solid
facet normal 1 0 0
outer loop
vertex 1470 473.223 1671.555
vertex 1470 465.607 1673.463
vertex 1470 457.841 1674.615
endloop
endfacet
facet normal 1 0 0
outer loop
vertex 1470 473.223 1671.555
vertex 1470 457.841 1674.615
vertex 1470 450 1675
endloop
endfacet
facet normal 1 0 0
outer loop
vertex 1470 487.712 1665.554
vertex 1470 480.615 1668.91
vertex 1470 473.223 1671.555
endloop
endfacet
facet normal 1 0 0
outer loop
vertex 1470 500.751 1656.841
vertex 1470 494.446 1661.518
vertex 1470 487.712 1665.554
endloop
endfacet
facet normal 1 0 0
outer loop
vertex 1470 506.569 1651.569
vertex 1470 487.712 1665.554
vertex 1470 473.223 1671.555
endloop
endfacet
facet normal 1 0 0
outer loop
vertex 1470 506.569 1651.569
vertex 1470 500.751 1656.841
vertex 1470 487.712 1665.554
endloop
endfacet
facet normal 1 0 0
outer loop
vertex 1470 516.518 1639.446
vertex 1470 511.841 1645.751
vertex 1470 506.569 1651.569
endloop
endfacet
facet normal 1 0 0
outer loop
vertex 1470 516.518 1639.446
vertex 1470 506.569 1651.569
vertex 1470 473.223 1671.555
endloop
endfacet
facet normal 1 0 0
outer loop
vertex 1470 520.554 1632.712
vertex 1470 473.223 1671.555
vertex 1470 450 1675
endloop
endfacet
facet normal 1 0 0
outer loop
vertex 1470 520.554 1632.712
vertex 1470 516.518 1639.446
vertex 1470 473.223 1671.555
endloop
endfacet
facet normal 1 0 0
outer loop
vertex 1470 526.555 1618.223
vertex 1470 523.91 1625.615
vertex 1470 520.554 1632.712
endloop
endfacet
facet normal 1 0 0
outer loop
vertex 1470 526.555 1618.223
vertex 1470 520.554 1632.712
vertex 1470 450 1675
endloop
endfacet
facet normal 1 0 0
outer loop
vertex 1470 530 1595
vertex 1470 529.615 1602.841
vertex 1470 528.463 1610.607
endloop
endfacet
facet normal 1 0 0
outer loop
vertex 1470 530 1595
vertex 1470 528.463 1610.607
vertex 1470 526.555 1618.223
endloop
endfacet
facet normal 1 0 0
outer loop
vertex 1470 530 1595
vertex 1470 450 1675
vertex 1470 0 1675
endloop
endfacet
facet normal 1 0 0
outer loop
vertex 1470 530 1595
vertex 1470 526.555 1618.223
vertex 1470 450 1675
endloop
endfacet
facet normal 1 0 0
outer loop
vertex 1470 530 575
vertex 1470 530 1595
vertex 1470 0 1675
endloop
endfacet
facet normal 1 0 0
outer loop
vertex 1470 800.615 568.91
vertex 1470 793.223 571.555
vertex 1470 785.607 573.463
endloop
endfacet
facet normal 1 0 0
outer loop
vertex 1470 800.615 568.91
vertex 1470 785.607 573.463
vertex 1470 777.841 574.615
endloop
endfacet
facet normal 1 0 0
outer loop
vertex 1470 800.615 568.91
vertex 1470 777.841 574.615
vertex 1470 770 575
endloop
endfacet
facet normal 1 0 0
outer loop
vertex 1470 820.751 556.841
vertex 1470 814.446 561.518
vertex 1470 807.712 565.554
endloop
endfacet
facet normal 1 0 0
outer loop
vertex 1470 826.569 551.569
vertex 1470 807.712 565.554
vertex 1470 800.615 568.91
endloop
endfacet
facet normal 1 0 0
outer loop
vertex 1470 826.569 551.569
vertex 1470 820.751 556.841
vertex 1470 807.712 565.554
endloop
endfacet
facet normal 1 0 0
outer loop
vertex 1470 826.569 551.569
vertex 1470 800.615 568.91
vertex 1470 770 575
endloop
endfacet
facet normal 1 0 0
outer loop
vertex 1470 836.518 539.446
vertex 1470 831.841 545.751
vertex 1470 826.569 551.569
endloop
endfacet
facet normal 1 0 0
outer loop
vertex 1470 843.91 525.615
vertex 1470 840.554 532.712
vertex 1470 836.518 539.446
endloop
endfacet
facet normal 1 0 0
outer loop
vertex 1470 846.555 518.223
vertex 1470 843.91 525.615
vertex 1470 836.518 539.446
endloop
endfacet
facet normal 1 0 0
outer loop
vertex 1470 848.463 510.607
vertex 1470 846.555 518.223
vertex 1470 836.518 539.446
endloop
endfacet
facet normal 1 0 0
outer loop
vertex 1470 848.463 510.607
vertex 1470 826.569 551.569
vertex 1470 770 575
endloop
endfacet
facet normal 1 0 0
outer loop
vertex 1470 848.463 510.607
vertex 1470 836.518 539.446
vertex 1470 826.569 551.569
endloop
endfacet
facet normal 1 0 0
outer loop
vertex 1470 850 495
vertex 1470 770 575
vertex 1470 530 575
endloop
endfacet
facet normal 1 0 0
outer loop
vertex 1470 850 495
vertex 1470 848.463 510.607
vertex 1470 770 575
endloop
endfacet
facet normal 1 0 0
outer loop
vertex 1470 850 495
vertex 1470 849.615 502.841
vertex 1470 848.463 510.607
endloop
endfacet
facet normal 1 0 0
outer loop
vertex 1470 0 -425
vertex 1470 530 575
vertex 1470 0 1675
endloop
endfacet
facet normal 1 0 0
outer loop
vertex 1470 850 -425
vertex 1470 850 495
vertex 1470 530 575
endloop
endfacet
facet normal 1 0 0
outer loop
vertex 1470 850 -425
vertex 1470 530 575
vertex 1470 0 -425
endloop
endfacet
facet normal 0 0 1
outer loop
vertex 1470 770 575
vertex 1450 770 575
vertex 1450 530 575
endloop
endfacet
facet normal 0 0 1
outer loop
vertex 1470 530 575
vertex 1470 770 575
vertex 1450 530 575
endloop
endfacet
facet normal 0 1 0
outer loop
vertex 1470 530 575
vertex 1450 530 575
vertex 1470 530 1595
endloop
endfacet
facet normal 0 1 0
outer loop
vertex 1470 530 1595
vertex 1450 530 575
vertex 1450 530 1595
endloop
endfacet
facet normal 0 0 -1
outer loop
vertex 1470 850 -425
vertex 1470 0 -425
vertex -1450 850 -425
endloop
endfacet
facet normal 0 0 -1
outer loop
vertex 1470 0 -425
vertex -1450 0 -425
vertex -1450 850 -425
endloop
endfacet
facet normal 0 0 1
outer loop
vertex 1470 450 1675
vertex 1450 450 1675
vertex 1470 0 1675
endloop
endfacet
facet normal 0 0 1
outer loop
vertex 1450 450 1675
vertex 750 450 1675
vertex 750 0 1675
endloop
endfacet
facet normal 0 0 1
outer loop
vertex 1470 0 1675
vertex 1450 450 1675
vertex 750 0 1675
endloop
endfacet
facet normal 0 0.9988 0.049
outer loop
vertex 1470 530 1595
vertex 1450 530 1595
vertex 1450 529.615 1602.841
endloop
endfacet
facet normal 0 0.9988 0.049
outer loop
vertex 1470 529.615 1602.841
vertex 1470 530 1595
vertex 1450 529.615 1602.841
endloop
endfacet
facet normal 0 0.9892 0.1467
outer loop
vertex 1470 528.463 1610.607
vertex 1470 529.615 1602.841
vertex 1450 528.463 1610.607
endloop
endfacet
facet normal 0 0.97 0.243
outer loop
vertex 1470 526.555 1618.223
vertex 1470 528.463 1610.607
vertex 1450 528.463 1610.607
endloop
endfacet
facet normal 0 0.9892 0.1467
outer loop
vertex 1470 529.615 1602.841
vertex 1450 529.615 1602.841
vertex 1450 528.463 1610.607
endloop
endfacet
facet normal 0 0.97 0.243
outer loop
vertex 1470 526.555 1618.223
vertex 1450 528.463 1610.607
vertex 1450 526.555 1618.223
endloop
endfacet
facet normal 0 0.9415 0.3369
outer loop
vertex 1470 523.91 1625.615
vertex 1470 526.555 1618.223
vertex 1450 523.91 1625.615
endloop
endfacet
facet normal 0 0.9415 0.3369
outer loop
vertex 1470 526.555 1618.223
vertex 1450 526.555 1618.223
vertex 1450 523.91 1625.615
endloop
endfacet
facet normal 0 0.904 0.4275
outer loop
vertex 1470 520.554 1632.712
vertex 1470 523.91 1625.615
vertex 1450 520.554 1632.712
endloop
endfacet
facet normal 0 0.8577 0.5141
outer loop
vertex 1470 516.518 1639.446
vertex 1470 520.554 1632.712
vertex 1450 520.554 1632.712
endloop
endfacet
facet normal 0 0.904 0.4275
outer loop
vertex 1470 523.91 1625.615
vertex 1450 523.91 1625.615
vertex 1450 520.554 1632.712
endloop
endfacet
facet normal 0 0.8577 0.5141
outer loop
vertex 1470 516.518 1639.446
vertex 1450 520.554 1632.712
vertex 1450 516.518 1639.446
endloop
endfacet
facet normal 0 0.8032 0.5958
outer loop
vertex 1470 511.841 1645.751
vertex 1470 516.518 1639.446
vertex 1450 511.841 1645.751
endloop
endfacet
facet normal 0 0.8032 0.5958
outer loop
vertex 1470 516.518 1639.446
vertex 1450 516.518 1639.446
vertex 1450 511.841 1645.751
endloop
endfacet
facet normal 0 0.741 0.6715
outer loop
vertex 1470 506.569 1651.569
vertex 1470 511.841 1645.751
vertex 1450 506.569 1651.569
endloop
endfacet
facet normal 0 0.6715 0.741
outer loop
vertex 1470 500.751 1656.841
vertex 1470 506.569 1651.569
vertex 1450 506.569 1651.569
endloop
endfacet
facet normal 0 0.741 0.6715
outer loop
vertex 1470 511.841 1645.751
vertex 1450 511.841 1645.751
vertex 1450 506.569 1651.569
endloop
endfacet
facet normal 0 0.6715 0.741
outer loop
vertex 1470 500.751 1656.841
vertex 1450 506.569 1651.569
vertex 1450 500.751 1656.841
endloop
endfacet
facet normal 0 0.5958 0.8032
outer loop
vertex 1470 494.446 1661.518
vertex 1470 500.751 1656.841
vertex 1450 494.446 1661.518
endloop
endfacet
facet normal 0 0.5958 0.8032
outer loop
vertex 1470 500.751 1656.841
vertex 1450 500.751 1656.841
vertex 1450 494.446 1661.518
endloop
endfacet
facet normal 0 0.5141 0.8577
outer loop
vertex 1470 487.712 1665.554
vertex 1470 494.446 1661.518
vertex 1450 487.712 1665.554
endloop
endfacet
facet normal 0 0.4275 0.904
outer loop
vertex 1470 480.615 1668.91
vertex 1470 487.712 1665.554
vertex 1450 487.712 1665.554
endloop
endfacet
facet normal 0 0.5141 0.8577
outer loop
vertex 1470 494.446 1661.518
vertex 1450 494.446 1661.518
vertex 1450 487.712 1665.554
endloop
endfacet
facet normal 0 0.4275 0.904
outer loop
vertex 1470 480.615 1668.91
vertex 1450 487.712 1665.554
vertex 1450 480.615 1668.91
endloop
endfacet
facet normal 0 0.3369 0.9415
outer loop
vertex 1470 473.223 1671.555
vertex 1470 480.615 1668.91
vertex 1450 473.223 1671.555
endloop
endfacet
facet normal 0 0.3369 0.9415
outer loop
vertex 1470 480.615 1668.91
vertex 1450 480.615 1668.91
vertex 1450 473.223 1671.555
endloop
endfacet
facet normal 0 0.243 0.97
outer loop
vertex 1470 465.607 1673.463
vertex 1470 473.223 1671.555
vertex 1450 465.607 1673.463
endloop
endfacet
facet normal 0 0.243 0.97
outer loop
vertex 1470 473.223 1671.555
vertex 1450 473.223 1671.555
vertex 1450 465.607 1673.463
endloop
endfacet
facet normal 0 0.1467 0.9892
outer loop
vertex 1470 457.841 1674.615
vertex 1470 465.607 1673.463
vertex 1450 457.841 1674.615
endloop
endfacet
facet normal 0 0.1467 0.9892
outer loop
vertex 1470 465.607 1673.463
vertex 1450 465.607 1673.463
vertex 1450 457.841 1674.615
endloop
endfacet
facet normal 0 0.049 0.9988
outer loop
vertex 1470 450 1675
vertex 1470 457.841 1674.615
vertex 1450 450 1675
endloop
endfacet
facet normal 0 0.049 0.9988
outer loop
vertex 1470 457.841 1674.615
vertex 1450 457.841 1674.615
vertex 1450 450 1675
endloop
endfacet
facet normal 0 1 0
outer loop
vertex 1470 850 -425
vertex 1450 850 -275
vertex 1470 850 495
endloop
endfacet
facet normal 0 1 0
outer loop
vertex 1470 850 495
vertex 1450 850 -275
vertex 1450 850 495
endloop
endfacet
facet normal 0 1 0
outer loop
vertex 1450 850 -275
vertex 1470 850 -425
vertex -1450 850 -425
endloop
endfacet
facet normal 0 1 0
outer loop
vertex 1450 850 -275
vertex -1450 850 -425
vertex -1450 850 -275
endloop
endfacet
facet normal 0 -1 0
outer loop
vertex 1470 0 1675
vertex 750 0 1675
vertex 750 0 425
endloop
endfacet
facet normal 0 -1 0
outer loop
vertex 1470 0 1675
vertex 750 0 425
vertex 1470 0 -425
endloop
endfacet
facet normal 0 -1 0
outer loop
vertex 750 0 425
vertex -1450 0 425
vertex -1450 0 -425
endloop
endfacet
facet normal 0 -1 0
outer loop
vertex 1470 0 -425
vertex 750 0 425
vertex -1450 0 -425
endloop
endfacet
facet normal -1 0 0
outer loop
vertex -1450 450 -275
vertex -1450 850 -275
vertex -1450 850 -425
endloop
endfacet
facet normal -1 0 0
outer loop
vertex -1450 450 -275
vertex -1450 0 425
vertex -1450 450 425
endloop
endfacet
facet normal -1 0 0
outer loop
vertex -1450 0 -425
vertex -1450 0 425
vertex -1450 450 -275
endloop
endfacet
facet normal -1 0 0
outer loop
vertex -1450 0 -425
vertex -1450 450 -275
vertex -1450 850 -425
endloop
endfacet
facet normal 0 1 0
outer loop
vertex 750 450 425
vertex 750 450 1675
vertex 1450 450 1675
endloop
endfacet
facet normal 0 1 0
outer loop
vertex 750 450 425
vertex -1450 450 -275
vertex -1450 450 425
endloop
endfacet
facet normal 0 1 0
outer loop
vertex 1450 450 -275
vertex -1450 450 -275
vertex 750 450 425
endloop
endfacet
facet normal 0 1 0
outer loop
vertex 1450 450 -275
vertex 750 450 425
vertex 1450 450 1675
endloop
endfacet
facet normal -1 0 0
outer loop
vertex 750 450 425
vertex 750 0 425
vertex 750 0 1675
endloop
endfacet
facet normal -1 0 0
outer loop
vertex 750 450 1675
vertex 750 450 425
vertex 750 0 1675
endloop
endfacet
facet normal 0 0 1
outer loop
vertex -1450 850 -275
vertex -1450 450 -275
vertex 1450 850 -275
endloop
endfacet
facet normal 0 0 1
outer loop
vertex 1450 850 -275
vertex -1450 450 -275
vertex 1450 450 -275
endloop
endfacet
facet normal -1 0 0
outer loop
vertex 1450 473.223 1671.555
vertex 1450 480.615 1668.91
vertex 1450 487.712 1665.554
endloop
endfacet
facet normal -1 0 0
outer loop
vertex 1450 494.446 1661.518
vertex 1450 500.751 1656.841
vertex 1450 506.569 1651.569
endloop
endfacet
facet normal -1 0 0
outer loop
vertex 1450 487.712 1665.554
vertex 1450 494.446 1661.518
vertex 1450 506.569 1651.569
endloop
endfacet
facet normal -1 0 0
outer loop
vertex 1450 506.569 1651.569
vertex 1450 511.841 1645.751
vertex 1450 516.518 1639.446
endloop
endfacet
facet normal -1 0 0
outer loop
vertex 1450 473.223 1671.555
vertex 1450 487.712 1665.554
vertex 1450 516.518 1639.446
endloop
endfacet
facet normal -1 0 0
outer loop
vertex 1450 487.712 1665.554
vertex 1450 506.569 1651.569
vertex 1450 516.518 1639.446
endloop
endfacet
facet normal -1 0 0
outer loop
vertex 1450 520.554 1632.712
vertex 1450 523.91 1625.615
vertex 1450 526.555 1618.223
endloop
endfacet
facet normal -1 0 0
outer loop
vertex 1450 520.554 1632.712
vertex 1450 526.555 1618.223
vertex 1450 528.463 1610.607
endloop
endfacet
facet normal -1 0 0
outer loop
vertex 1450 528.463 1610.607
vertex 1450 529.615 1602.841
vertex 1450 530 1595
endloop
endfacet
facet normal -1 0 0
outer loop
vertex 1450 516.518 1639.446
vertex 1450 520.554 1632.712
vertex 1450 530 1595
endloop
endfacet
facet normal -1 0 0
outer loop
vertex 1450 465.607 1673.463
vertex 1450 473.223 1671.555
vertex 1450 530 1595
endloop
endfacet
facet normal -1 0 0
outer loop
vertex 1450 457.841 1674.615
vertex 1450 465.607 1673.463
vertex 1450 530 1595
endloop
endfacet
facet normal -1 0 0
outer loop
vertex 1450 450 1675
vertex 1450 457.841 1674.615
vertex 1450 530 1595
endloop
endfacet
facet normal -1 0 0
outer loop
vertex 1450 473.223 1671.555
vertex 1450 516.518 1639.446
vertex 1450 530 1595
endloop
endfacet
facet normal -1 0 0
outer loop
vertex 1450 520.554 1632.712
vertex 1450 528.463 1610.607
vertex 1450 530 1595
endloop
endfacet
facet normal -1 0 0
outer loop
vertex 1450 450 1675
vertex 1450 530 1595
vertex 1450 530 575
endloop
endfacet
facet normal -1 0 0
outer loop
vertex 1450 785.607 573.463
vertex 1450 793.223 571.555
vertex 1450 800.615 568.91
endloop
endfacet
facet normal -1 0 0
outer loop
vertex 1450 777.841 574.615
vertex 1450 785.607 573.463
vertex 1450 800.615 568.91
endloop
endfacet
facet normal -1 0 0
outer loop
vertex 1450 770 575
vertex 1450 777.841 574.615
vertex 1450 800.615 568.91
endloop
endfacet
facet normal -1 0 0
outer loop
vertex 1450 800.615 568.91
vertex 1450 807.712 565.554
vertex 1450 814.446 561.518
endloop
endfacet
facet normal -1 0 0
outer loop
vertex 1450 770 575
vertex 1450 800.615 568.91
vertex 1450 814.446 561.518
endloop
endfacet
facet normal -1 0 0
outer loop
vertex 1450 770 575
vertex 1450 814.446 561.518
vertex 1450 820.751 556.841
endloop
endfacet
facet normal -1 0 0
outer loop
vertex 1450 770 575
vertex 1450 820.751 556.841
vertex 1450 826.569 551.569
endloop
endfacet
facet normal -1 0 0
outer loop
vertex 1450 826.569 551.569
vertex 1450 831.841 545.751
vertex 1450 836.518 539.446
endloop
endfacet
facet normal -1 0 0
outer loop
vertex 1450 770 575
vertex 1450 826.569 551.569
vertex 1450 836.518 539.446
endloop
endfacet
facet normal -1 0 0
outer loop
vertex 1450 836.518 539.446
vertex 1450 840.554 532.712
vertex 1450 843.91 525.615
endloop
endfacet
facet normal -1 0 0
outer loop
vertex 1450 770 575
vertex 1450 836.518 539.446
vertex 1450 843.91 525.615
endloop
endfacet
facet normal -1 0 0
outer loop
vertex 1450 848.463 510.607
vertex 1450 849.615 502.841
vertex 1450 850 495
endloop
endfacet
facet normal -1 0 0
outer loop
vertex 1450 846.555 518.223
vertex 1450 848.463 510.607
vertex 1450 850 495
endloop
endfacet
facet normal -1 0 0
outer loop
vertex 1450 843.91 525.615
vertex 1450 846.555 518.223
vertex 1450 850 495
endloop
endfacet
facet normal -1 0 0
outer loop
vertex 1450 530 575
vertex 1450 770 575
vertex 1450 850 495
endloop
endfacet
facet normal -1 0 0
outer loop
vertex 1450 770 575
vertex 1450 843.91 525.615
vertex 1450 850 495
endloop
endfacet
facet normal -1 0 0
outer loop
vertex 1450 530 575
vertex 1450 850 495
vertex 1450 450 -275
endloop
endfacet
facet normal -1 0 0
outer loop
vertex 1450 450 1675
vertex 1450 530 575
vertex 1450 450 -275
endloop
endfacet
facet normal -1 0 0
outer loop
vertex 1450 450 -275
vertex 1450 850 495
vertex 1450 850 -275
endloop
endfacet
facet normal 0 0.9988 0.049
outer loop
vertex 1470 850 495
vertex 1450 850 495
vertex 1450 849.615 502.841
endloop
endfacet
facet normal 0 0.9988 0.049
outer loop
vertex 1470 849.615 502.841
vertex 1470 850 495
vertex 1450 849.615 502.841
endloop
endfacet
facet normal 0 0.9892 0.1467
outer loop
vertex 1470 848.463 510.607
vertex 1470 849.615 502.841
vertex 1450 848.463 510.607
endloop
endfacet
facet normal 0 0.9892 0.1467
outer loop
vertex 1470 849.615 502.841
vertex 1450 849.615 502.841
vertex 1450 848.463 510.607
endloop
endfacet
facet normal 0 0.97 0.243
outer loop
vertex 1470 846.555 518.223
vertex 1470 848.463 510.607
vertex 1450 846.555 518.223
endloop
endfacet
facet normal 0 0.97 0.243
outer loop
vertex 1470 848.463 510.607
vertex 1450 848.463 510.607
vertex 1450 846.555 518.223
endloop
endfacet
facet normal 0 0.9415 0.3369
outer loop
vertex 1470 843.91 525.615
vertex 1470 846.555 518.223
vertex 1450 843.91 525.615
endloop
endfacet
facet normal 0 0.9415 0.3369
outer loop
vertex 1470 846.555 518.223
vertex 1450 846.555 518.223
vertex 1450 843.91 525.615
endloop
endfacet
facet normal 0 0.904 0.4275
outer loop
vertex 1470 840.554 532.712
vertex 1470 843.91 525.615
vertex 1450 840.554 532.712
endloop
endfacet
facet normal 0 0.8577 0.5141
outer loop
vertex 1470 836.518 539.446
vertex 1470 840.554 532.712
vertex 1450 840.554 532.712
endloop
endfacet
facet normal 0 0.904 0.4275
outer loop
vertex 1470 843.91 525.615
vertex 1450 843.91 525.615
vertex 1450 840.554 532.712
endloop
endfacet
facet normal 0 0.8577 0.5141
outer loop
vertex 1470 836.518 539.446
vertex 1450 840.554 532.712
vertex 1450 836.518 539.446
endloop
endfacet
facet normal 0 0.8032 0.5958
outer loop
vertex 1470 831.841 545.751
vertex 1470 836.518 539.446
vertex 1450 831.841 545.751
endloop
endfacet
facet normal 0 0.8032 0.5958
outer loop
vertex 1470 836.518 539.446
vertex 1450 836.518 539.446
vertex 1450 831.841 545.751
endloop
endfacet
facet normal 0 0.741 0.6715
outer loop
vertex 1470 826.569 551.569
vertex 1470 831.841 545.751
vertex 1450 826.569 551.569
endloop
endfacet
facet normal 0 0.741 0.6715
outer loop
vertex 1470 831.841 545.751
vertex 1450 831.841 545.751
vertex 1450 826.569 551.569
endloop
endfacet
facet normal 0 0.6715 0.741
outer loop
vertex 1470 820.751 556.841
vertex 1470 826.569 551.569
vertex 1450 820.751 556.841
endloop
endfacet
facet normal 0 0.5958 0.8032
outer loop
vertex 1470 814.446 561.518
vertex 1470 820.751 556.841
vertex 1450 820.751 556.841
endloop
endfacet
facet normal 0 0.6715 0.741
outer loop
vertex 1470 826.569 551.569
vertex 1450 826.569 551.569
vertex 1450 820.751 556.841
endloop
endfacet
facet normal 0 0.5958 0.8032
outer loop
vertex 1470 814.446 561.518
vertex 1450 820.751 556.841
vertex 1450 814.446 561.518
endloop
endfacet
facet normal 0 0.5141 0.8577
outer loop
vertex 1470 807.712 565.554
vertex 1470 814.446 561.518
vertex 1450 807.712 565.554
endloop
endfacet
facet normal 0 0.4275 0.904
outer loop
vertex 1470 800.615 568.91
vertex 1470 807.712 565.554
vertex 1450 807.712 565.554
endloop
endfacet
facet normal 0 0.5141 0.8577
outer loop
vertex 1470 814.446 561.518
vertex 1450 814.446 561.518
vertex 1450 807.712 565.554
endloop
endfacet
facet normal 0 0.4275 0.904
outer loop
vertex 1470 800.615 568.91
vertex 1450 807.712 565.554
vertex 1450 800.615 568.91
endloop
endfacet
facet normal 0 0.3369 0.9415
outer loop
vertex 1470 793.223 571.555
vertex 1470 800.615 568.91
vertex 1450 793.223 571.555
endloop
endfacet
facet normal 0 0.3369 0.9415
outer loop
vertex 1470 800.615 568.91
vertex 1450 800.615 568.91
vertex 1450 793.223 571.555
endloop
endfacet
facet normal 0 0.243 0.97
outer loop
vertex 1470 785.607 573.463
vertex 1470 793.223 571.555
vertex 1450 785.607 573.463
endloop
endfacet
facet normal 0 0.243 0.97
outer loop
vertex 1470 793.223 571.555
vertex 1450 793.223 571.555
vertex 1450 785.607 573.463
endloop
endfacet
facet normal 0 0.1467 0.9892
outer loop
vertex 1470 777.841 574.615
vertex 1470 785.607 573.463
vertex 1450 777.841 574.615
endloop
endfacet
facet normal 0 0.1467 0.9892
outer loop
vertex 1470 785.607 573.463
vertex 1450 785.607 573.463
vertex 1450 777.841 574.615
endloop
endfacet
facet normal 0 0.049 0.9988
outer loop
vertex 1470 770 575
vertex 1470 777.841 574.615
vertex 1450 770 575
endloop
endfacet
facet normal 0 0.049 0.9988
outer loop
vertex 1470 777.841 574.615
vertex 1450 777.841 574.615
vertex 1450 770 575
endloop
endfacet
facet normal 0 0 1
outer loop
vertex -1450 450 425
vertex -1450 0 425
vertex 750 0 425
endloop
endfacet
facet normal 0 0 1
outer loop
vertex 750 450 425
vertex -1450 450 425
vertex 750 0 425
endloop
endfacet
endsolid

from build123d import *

# Parameters (mm, degrees)
BOSS_EXTRUDE1_DEPTH = 450
SKETCH3_W           = 2900
SKETCH3_H           = 150
BOSS_EXTRUDE3_DEPTH = 400
BOSS_EXTRUDE4_DEPTH = 20


with BuildPart() as part:
    # Sketch1 → Boss-Extrude1 (new body)
    with BuildSketch(Plane(origin=(0, 0, 0), x_dir=(1, 0, 0), z_dir=(0, 1, 0))):
        Polygon((750, -425), (750, -1675), (1450, -1675), (1450, 425), (-1450, 425), (-1450, -425), align=None)
    extrude(amount=BOSS_EXTRUDE1_DEPTH)

    # Sketch3 → Boss-Extrude3 (add)
    with BuildSketch(Plane(origin=(0, 450, 0), x_dir=(1, 0, 0), z_dir=(0, 1, 0))):
        with Locations((0, 350)):
            Rectangle(SKETCH3_W, SKETCH3_H)
    extrude(amount=BOSS_EXTRUDE3_DEPTH)

    # Sketch5 → Boss-Extrude4 (add)
    with BuildSketch(Plane(origin=(1450, 0, 0), x_dir=(0, 0, -1), z_dir=(1, 0, 0))):
        with BuildLine():
            Line((-575, 770), (-575, 530))
            Line((-575, 530), (-1595, 530))
            ThreePointArc((-1595, 530), (-1651.568542495, 506.568542495), (-1675, 450))
            Line((-1675, 450), (-1675, 0))
            Line((-1675, 0), (425, 0))
            Line((425, 0), (425, 850))
            Line((425, 850), (-495, 850))
            ThreePointArc((-495, 850), (-551.568542495, 826.568542495), (-575, 770))
        make_face()
    extrude(amount=BOSS_EXTRUDE4_DEPTH)


solid = part.part
